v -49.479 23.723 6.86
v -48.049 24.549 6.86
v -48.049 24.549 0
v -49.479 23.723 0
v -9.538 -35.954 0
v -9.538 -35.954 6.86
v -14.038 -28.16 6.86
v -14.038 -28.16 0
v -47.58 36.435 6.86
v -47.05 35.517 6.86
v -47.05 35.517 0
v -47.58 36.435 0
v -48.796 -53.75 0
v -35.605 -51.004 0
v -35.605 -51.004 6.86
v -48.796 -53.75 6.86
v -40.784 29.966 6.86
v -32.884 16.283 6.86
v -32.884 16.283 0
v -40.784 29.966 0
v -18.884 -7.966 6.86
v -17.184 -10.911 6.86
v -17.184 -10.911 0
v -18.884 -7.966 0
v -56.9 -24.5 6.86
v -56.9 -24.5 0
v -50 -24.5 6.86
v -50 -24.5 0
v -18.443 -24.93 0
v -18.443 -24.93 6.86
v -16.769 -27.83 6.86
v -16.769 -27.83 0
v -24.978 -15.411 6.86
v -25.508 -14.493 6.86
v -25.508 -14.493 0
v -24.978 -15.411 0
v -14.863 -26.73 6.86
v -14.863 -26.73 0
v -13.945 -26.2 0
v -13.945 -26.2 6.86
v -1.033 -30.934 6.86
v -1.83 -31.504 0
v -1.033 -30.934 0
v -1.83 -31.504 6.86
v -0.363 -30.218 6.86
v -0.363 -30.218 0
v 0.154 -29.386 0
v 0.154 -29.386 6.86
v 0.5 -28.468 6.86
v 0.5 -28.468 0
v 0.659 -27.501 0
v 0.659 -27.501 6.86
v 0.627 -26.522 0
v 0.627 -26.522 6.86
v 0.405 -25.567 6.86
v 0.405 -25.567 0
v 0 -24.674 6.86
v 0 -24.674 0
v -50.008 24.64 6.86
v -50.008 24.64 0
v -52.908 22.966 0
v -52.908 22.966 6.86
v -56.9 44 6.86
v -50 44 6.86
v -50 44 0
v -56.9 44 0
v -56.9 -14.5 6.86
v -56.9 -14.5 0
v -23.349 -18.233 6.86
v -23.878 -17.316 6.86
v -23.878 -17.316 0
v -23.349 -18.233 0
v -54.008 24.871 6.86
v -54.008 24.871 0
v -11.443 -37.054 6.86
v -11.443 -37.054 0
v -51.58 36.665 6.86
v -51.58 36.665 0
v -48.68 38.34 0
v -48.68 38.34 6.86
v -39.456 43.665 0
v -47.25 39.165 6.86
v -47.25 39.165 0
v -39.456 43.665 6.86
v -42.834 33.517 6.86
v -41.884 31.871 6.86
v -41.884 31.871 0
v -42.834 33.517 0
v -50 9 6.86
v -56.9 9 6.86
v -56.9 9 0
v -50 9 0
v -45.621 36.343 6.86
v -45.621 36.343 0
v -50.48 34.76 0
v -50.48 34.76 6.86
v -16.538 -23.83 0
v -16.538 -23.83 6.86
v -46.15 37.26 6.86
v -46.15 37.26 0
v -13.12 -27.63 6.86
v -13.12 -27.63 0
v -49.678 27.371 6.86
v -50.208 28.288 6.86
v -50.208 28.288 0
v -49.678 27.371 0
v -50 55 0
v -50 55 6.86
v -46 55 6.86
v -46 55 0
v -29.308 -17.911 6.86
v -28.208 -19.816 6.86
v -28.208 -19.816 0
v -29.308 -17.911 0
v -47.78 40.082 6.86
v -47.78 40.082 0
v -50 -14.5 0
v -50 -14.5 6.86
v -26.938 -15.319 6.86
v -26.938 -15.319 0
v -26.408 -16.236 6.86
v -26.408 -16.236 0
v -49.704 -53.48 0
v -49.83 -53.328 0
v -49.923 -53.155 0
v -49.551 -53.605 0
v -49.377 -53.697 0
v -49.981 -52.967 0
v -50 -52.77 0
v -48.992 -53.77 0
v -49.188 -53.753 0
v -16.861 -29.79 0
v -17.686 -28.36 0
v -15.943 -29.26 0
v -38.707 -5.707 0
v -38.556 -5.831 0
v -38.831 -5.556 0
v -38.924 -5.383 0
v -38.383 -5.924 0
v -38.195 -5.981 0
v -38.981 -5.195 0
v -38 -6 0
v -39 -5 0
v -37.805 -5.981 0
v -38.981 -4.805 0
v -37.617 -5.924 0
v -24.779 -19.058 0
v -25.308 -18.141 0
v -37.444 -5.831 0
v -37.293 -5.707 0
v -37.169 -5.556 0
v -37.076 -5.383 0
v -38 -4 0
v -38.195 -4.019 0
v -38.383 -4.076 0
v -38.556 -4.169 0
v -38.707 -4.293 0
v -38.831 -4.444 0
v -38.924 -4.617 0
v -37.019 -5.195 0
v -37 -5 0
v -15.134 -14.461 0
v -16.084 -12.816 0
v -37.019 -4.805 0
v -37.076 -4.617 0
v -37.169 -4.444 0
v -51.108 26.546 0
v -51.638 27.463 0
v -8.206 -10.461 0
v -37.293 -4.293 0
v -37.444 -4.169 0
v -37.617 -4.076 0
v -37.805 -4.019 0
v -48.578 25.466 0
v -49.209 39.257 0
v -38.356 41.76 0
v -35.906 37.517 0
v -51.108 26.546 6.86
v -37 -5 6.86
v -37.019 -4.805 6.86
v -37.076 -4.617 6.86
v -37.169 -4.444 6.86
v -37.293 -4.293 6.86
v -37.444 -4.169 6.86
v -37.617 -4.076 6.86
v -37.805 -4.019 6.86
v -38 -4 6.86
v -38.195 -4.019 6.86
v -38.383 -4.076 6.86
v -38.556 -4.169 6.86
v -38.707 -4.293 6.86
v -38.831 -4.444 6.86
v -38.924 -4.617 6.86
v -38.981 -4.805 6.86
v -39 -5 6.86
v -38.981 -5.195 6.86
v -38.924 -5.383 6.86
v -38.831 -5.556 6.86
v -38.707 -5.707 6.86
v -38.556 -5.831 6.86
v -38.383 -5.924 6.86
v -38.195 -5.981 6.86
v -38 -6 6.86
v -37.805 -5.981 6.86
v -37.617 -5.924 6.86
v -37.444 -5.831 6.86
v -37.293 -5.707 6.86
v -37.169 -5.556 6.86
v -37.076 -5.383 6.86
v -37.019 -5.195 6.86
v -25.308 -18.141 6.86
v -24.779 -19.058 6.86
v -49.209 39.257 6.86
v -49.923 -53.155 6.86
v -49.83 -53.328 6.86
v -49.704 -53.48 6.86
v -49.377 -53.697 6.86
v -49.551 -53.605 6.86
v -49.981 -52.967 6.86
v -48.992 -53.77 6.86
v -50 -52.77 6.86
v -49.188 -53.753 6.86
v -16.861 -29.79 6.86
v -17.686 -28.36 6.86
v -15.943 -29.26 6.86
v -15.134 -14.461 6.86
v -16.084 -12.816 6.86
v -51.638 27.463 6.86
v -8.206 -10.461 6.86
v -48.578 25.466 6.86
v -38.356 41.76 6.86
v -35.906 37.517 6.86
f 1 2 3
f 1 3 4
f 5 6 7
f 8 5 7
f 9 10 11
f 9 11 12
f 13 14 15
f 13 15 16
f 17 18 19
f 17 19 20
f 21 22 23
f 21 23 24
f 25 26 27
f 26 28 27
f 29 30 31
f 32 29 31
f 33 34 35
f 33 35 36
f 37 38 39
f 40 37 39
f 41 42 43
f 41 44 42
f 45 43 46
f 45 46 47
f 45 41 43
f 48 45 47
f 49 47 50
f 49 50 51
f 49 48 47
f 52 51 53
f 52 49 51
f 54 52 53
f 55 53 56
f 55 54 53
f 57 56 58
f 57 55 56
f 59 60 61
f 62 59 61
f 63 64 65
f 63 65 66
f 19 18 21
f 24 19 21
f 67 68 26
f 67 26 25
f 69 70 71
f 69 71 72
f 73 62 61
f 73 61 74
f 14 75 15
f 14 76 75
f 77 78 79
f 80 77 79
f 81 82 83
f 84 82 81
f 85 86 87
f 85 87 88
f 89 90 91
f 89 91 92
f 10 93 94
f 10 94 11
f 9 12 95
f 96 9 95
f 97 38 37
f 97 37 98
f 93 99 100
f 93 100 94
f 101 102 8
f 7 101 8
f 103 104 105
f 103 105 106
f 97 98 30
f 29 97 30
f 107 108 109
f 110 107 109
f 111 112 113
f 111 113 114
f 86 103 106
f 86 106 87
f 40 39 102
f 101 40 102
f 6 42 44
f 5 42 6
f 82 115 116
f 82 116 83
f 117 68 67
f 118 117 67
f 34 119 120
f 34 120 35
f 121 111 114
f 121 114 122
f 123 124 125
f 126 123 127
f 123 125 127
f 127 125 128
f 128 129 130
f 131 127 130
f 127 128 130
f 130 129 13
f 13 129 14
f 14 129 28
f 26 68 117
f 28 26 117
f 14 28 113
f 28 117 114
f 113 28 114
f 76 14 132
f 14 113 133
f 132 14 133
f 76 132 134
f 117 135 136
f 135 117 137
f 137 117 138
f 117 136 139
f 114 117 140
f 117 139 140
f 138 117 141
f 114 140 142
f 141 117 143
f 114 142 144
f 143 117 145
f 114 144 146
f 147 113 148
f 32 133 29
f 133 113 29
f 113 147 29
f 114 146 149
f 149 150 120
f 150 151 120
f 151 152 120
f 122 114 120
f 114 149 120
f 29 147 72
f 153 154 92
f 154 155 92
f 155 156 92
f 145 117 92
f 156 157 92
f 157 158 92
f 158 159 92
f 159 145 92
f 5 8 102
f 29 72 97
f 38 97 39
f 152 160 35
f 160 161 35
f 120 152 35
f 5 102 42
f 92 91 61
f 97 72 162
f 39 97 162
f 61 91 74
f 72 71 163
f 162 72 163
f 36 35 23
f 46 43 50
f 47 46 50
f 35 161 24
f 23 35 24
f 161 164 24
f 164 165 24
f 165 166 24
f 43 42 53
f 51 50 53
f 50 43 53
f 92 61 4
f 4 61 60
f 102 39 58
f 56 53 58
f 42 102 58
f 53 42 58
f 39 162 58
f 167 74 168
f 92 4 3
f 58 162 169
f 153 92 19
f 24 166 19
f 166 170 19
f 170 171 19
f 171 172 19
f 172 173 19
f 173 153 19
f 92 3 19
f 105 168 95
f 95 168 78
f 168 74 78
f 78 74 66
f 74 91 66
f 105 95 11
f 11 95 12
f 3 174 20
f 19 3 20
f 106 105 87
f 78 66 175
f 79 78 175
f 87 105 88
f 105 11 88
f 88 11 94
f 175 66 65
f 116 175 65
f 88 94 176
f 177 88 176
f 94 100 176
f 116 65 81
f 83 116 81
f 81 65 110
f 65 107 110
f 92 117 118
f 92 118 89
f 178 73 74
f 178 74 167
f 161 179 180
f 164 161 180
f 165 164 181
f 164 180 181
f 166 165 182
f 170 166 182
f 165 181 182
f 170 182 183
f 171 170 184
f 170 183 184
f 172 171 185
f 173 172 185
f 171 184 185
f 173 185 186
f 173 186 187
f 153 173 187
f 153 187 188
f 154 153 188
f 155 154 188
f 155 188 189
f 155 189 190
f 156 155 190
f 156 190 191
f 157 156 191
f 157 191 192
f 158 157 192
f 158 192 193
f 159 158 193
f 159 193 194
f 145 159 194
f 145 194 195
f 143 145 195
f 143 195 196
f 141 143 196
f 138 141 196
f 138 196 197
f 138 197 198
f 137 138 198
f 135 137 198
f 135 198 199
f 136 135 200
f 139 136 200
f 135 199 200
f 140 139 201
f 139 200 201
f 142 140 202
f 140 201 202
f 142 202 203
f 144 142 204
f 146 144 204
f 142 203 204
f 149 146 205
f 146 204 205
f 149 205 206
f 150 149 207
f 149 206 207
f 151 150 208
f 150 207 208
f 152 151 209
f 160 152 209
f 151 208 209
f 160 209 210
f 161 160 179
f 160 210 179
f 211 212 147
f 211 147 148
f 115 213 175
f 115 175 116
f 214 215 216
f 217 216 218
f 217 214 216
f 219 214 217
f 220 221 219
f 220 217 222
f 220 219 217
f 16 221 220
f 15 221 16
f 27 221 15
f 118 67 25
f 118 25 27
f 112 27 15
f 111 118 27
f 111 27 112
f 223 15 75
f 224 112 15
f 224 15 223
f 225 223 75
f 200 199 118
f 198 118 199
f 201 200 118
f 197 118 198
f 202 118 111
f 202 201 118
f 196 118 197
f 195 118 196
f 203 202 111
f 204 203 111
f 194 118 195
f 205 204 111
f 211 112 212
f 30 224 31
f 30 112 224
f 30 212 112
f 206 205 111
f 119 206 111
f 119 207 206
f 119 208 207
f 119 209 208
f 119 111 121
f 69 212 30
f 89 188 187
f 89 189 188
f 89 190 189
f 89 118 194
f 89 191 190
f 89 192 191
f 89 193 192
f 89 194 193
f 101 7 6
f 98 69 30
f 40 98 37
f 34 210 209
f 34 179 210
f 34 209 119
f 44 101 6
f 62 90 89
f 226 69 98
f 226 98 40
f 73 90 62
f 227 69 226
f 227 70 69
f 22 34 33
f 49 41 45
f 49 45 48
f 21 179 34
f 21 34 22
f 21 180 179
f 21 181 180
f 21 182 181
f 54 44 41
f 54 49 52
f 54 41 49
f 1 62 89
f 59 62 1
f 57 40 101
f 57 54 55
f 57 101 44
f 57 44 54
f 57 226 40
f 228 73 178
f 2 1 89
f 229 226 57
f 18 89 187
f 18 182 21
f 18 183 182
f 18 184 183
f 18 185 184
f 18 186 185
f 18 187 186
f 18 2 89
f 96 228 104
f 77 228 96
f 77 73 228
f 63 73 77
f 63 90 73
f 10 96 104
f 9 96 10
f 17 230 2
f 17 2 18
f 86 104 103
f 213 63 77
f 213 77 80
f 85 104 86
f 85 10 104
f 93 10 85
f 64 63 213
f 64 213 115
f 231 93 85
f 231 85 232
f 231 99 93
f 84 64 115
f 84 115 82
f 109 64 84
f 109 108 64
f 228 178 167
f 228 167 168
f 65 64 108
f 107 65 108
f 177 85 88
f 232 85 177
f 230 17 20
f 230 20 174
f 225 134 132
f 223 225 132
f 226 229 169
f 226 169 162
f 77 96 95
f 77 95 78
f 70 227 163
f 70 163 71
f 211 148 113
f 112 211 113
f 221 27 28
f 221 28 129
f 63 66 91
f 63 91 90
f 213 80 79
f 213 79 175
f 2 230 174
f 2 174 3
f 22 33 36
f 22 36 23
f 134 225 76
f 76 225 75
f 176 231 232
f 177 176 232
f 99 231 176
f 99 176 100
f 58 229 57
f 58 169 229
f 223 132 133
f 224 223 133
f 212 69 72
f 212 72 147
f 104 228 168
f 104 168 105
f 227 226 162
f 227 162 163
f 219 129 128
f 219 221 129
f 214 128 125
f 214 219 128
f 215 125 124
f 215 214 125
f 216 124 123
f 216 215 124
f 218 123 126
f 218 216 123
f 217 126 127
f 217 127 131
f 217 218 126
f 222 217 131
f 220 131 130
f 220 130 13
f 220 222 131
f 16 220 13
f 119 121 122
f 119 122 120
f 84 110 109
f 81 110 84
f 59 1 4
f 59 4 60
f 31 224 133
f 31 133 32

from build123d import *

# Parameters (mm, degrees)
SKETCH1_W                = 100
SKETCH1_H                = 110
BOSS_EXTRUDE1_DEPTH      = 6.86
BOSS_EXTRUDE2_DEPTH      = 6.86
CUT_EXTRUDE1_DEPTH       = 84.419927529
CUT_EXTRUDE1_DEPTH_BACK  = 84.419927529
CUT_EXTRUDE5_DEPTH       = 84.419927529
CUT_EXTRUDE6_DEPTH       = 84.419927529
SKETCH7_W                = 42
SKETCH7_H                = 3.55
CUT_EXTRUDE7_DEPTH       = 84.419927529
SKETCH8_W                = 5
SKETCH8_H                = 7.62
CUT_EXTRUDE8_DEPTH       = 84.419927529
CUT_EXTRUDE9_DEPTH       = 84.419927529
LPATTERN1_COUNT          = 2
LPATTERN1_PITCH          = 49.4
SKETCH15_W               = 6.5
SKETCH15_H               = 9.5
BOSS_EXTRUDE3_DEPTH      = 6.86
CUT_EXTRUDE14_START      = -6.86
CUT_EXTRUDE14_DEPTH      = 6.86
BOSS_EXTRUDE4_DEPTH      = 6.86
FILLET3_R                = 5
FILLET4_R                = 7
CUT_EXTRUDE11_DEPTH      = 84.419927529
BOSS_EXTRUDE5_DEPTH      = 6.86
BOSS_EXTRUDE6_DEPTH      = 6.86
CUT_EXTRUDE12_DEPTH      = 84.419927529
CUT_EXTRUDE12_DEPTH_BACK = 84.419927529
SKETCH22_R               = 1
CUT_EXTRUDE13_DEPTH      = 84.419927529
CUT_EXTRUDE15_DEPTH      = 84.419927529
CUT_EXTRUDE15_DEPTH_BACK = 84.419927529
CUT_EXTRUDE16_DEPTH      = 84.419927529
CUT_EXTRUDE16_DEPTH_BACK = 84.419927529
FILLET2_R                = 1
BOSS_EXTRUDE8_START      = -6.86
BOSS_EXTRUDE8_DEPTH      = 6.86
CUT_EXTRUDE19_START      = -10
CUT_EXTRUDE19_DEPTH      = 10
SKETCH28_W               = 6.86
SKETCH28_H               = 9.5
SKETCH28_H_2             = 35
BOSS_EXTRUDE9_DEPTH      = 0.4
BOSS_EXTRUDE10_REACH     = 81.915
SKETCH29_W               = 6.86
SKETCH29_H               = 0.5
BOSS_EXTRUDE11_DEPTH     = 6.86


# Read off the part's stored shape, not the designer's step: Cut-Extrude14
with BuildPart() as part:
    # Sketch1 → Boss-Extrude1 (new body)
    with BuildSketch(Plane.XY):
        Rectangle(SKETCH1_W, SKETCH1_H)
    extrude(amount=BOSS_EXTRUDE1_DEPTH)

    # Sketch14 → Boss-Extrude2 (add)
    with BuildSketch(Plane.XY.offset(6.86)):
        with BuildLine():
            Line((-50, 44), (-56.9, 44))
            Line((-56.9, 44), (-57.252653961, 46))
            Line((-57.252653961, 46), (-60.252653961, 46))
            ThreePointArc((-60.252653961, 46), (-62.140394827, 27.177051725), (-56.9, 9))
            Line((-56.9, 9), (-50, 9))
            Line((-50, 9), (-50, 44))
        make_face()
    extrude(amount=-BOSS_EXTRUDE2_DEPTH)

    # Sketch9 → Cut-Extrude1 (cut, two sides: drawn at the far end of the back side and taken through both)
    with BuildSketch(Plane.XY.offset(6.86).offset(-CUT_EXTRUDE1_DEPTH_BACK)):
        Polygon((-202.691345573, 326.397371639), (-46, 55), (2.5, -29.004464167), (-49.825975731, -59.214880341), (-321.22334737, -215.906225914), (291.08659924, -349.739606366), (409.618601037, 192.563991188), align=None)
    extrude(amount=CUT_EXTRUDE1_DEPTH + CUT_EXTRUDE1_DEPTH_BACK, mode=Mode.SUBTRACT)

    # Sketch11 → Cut-Extrude5 (cut, through all)
    with BuildSketch(Plane.XY.offset(6.86)):
        Polygon((-35.90593882, 37.516573181), (-8.20593882, -10.461234188), (-15.13414205, -14.461234188), (-42.83414205, 33.516573181), align=None)
    extrude(amount=-CUT_EXTRUDE5_DEPTH, mode=Mode.SUBTRACT)

    # Sketch12 → Cut-Extrude6 (cut, through all)
    with BuildSketch(Plane.XY.offset(6.86)):
        Polygon((-18.88414205, -7.96604366), (-21.534179786, -9.49604366), (-35.534179786, 14.752667646), (-32.88414205, 16.282667646), align=None)
    extrude(amount=-CUT_EXTRUDE6_DEPTH, mode=Mode.SUBTRACT)

    # Sketch7 → Cut-Extrude7 (cut, through all)
    with BuildSketch(Plane.XY.offset(6.86)):
        with Locations((-50, -34)):
            Rectangle(SKETCH7_W, SKETCH7_H)
    extrude(amount=-CUT_EXTRUDE7_DEPTH, mode=Mode.SUBTRACT)

    # Sketch8 → Cut-Extrude8 (cut, through all)
    with BuildSketch(Plane.XY.offset(6.86)):
        with Locations((-36.5, -34)):
            Rectangle(SKETCH8_W, SKETCH8_H)
    extrude(amount=-CUT_EXTRUDE8_DEPTH, mode=Mode.SUBTRACT)

    # Sketch13 → Cut-Extrude9 (cut, through all)
    with BuildSketch(Plane.XY.offset(6.86)):
        Polygon((-41.88414205, 31.871124914), (-40.78414205, 29.965869026), (-48.578370684, 25.465869026), (-48.048870684, 24.548748123), (-49.478678626, 23.723248123), (-50.008178626, 24.640369026), (-52.908497703, 22.965869026), (-54.008497703, 24.871124914), (-51.108178626, 26.545624914), (-51.637678626, 27.462745817), (-50.207870684, 28.288245817), (-49.678370684, 27.371124914), align=None)
        Polygon((-39.45593882, 43.665353548), (-38.35593882, 41.76009766), (-46.150167454, 37.26009766), (-45.620667454, 36.342976757), (-47.050475396, 35.517476757), (-47.579975396, 36.43459766), (-50.480294473, 34.76009766), (-51.580294473, 36.665353548), (-48.679975396, 38.339853548), (-49.209475396, 39.256974451), (-47.779667454, 40.082474451), (-47.250167454, 39.165353548), align=None)
        Polygon((-18.443009001, -24.930108514), (-11.443009001, -37.054464167), (-9.537753113, -35.954464167), (-16.537753113, -23.830108514), align=None)
    cut_extrude9 = extrude(amount=-CUT_EXTRUDE9_DEPTH, mode=Mode.SUBTRACT)

    # LPattern1: Cut-Extrude9 ×2
    with Locations(*[Vector(0.49999999999999345, -0.8660254037844425, 0) * (i * LPATTERN1_PITCH) for i in range(1, LPATTERN1_COUNT)]):
        add(cut_extrude9, mode=Mode.SUBTRACT)

    # Sketch15 → Boss-Extrude3 (add)
    with BuildSketch(Plane.XY.offset(6.86)):
        with Locations((-53.25, -19.75)):
            Rectangle(SKETCH15_W, SKETCH15_H)
    extrude(amount=-BOSS_EXTRUDE3_DEPTH)

    # Cut-Extrude14 outline → Cut-Extrude14 (cut)
    with BuildSketch(Plane.XY.offset(6.86).offset(CUT_EXTRUDE14_START)):
        Polygon((-56.5, -15), (-56.5, -16.500643242), (-50, -15), align=None)
    extrude(amount=CUT_EXTRUDE14_DEPTH, mode=Mode.SUBTRACT)

    # Sketch16 → Boss-Extrude4 (add)
    with BuildSketch(Plane.XY.offset(6.86)):
        Polygon((-35.605117767, -51.004464167), (-34.105117767, -53.602540378), (-36.525588833, -55), (-42.525588833, -55), (-44.558274136, -51.479285778), align=None)
    extrude(amount=-BOSS_EXTRUDE4_DEPTH)

    # Fillet3
    fillet3_edges = [part.edges().sort_by_distance(p)[0] for p in [
        (2.5, -29.004464167, 3.43),
    ]]
    fillet(fillet3_edges, radius=FILLET3_R)

    # Fillet4
    fillet4_edges = [part.edges().sort_by_distance(p)[0] for p in [
        (-56.9, 9, 3.43),
    ]]
    fillet(fillet4_edges, radius=FILLET4_R)

    # Sketch18 → Cut-Extrude11 (cut, through all)
    with BuildSketch(Plane.XY.offset(6.86)):
        Polygon((-17.686495929, -28.360427591), (-13.945266185, -26.200427591), (-13.119766185, -27.630235533), (-16.860995929, -29.790235533), align=None)
    extrude(amount=-CUT_EXTRUDE11_DEPTH, mode=Mode.SUBTRACT)

    # Sketch19 → Boss-Extrude5 (add)
    with BuildSketch(Plane.XY.offset(6.86)):
        Polygon((-24.334179786, -4.646301399), (-23.234179786, -6.551557287), (-25.780294473, -8.021557287), (-26.880294473, -6.116301399), align=None)
    extrude(amount=-BOSS_EXTRUDE5_DEPTH)

    # Sketch20 → Boss-Extrude6 (add)
    with BuildSketch(Plane.XY.offset(6.86)):
        Polygon((-32.88414205, 16.282667646), (-18.88414205, -7.96604366), (-23.822038778, -10.816939665), (-37.822038778, 13.431771641), align=None)
    extrude(amount=-BOSS_EXTRUDE6_DEPTH)

    # Sketch21 → Cut-Extrude12 (cut, two sides: drawn at the far end of the back side and taken through both)
    with BuildSketch(Plane.XY.offset(6.86).offset(-CUT_EXTRUDE12_DEPTH_BACK)):
        Polygon((-50, 55), (-50, 44), (-48.060403212, 55), align=None)
    extrude(amount=CUT_EXTRUDE12_DEPTH + CUT_EXTRUDE12_DEPTH_BACK, mode=Mode.SUBTRACT)

    # Sketch22 → Cut-Extrude13 (cut, through all)
    with BuildSketch(Plane.XY.offset(6.86)):
        with Locations((-38, -5)):
            Circle(SKETCH22_R)
    extrude(amount=-CUT_EXTRUDE13_DEPTH, mode=Mode.SUBTRACT)

    # Sketch24 → Cut-Extrude15 (cut, two sides: drawn at the far end of the back side and taken through both)
    with BuildSketch(Plane.XY.offset(6.86).offset(-CUT_EXTRUDE15_DEPTH_BACK)):
        Polygon((207.425051562, 16.452548282), (-35.605117767, -51.004464167), (-50, -55), (-293.030169328, -122.457012449), (-158.11614443, -608.517351106), (342.33907646, -469.607790375), align=None)
    extrude(amount=CUT_EXTRUDE15_DEPTH + CUT_EXTRUDE15_DEPTH_BACK, mode=Mode.SUBTRACT)

    # Sketch26 → Cut-Extrude16 (cut, two sides: drawn at the far end of the back side and taken through both)
    with BuildSketch(Plane.XY.offset(6.86).offset(-CUT_EXTRUDE16_DEPTH_BACK)):
        Polygon((209.546353054, 0.01089), (-35.605117767, -51.004464167), (-50, -54), (-295.15147082, -105.015354167), (-193.120762486, -595.318295807), (311.577061387, -490.29205164), align=None)
    extrude(amount=CUT_EXTRUDE16_DEPTH + CUT_EXTRUDE16_DEPTH_BACK, mode=Mode.SUBTRACT)

    # Fillet2
    fillet2_edges = [part.edges().sort_by_distance(p)[0] for p in [
        (-60.252653961, 46, 3.43),
        (-56.5, -24.5, 3.43),
        (-56.5, -16.500643242, 3.43),
        (-50, -54, 3.43),
    ]]
    fillet(fillet2_edges, radius=FILLET2_R)

    # Sketch27 → Boss-Extrude8 (add)
    with BuildSketch(Plane.XY.offset(6.86).offset(BOSS_EXTRUDE8_START)):
        with BuildLine():
            Line((-55.724951054, -16.321709094), (-50, -15))
            Line((-50, -15), (-56.5, -15))
            Line((-56.5, -15), (-56.5, -17.296079159))
            ThreePointArc((-56.5, -17.296079159), (-56.282608157, -16.673564522), (-55.724951054, -16.321709094))
        make_face()
        with BuildLine():
            ThreePointArc((-52.380008746, 9), (-54.54635817, 9.343654894), (-56.5, 10.340877094))
            Line((-56.5, 10.340877094), (-56.5, 9))
            Line((-56.5, 9), (-52.380008746, 9))
        make_face()
        with BuildLine():
            Line((-56.5, -24.5), (-55.5, -24.5))
            ThreePointArc((-55.5, -24.5), (-56.207106781, -24.207106781), (-56.5, -23.5))
            Line((-56.5, -23.5), (-56.5, -24.5))
        make_face()
    extrude(amount=BOSS_EXTRUDE8_DEPTH)

    # Sketch27<5> → Cut-Extrude19 (cut)
    with BuildSketch(Plane.XY.offset(6.86).offset(CUT_EXTRUDE19_START)):
        with BuildLine():
            Line((-56.5, 10.340877094), (-56.5, 44))
            Line((-56.5, 44), (-56.9, 44))
            Line((-56.9, 44), (-57.252653961, 46))
            Line((-57.252653961, 46), (-59.50182182, 46))
            ThreePointArc((-59.50182182, 46), (-60.105291207, 45.797386167), (-60.464218102, 45.271649399))
            ThreePointArc((-60.464218102, 45.271649399), (-62.283923616, 29.230647449), (-58.897432775, 13.445947531))
            ThreePointArc((-58.897432775, 13.445947531), (-57.920678072, 11.722035132), (-56.5, 10.340877094))
        make_face()
    extrude(amount=CUT_EXTRUDE19_DEPTH, mode=Mode.SUBTRACT)

    # Sketch28 → Boss-Extrude9 (add)
    with BuildSketch(Plane.ZY.offset(56.5)):
        with Locations((3.43, -19.75)):
            Rectangle(SKETCH28_W, SKETCH28_H)
        with Locations((3.43, 26.5)):
            Rectangle(SKETCH28_W, SKETCH28_H_2)
    extrude(amount=BOSS_EXTRUDE9_DEPTH)

    # Sketch29 → Boss-Extrude10 (add, up to next)
    with BuildSketch(Plane.ZY.offset(56.9), mode=Mode.PRIVATE) as boss_extrude10_sk1:
        with Locations((3.43, -14.75)):
            Rectangle(SKETCH29_W, SKETCH29_H)
    boss_extrude10_tool1 = extrude(boss_extrude10_sk1.sketch, amount=-BOSS_EXTRUDE10_REACH, mode=Mode.PRIVATE) - part.part
    add(boss_extrude10_tool1.solids().sort_by_distance((-56.9, -14.75, 3.43))[0])

    # Sketch30 → Boss-Extrude11 (add)
    with BuildSketch(Plane.XY.offset(6.86)):
        Polygon((-39, -32.225), (-50, -32.225), (-50, -35.775), (-39, -35.775), (-39, -37.81), (-34, -37.81), (-34, -35.775), (-29, -35.775), (-29, -32.225), (-34, -32.225), (-34, -30.19), (-39, -30.19), align=None)
        Polygon((-50, 55), (-48.060403212, 55), (-50, 44), align=None)
    extrude(amount=-BOSS_EXTRUDE11_DEPTH)


solid = part.part
